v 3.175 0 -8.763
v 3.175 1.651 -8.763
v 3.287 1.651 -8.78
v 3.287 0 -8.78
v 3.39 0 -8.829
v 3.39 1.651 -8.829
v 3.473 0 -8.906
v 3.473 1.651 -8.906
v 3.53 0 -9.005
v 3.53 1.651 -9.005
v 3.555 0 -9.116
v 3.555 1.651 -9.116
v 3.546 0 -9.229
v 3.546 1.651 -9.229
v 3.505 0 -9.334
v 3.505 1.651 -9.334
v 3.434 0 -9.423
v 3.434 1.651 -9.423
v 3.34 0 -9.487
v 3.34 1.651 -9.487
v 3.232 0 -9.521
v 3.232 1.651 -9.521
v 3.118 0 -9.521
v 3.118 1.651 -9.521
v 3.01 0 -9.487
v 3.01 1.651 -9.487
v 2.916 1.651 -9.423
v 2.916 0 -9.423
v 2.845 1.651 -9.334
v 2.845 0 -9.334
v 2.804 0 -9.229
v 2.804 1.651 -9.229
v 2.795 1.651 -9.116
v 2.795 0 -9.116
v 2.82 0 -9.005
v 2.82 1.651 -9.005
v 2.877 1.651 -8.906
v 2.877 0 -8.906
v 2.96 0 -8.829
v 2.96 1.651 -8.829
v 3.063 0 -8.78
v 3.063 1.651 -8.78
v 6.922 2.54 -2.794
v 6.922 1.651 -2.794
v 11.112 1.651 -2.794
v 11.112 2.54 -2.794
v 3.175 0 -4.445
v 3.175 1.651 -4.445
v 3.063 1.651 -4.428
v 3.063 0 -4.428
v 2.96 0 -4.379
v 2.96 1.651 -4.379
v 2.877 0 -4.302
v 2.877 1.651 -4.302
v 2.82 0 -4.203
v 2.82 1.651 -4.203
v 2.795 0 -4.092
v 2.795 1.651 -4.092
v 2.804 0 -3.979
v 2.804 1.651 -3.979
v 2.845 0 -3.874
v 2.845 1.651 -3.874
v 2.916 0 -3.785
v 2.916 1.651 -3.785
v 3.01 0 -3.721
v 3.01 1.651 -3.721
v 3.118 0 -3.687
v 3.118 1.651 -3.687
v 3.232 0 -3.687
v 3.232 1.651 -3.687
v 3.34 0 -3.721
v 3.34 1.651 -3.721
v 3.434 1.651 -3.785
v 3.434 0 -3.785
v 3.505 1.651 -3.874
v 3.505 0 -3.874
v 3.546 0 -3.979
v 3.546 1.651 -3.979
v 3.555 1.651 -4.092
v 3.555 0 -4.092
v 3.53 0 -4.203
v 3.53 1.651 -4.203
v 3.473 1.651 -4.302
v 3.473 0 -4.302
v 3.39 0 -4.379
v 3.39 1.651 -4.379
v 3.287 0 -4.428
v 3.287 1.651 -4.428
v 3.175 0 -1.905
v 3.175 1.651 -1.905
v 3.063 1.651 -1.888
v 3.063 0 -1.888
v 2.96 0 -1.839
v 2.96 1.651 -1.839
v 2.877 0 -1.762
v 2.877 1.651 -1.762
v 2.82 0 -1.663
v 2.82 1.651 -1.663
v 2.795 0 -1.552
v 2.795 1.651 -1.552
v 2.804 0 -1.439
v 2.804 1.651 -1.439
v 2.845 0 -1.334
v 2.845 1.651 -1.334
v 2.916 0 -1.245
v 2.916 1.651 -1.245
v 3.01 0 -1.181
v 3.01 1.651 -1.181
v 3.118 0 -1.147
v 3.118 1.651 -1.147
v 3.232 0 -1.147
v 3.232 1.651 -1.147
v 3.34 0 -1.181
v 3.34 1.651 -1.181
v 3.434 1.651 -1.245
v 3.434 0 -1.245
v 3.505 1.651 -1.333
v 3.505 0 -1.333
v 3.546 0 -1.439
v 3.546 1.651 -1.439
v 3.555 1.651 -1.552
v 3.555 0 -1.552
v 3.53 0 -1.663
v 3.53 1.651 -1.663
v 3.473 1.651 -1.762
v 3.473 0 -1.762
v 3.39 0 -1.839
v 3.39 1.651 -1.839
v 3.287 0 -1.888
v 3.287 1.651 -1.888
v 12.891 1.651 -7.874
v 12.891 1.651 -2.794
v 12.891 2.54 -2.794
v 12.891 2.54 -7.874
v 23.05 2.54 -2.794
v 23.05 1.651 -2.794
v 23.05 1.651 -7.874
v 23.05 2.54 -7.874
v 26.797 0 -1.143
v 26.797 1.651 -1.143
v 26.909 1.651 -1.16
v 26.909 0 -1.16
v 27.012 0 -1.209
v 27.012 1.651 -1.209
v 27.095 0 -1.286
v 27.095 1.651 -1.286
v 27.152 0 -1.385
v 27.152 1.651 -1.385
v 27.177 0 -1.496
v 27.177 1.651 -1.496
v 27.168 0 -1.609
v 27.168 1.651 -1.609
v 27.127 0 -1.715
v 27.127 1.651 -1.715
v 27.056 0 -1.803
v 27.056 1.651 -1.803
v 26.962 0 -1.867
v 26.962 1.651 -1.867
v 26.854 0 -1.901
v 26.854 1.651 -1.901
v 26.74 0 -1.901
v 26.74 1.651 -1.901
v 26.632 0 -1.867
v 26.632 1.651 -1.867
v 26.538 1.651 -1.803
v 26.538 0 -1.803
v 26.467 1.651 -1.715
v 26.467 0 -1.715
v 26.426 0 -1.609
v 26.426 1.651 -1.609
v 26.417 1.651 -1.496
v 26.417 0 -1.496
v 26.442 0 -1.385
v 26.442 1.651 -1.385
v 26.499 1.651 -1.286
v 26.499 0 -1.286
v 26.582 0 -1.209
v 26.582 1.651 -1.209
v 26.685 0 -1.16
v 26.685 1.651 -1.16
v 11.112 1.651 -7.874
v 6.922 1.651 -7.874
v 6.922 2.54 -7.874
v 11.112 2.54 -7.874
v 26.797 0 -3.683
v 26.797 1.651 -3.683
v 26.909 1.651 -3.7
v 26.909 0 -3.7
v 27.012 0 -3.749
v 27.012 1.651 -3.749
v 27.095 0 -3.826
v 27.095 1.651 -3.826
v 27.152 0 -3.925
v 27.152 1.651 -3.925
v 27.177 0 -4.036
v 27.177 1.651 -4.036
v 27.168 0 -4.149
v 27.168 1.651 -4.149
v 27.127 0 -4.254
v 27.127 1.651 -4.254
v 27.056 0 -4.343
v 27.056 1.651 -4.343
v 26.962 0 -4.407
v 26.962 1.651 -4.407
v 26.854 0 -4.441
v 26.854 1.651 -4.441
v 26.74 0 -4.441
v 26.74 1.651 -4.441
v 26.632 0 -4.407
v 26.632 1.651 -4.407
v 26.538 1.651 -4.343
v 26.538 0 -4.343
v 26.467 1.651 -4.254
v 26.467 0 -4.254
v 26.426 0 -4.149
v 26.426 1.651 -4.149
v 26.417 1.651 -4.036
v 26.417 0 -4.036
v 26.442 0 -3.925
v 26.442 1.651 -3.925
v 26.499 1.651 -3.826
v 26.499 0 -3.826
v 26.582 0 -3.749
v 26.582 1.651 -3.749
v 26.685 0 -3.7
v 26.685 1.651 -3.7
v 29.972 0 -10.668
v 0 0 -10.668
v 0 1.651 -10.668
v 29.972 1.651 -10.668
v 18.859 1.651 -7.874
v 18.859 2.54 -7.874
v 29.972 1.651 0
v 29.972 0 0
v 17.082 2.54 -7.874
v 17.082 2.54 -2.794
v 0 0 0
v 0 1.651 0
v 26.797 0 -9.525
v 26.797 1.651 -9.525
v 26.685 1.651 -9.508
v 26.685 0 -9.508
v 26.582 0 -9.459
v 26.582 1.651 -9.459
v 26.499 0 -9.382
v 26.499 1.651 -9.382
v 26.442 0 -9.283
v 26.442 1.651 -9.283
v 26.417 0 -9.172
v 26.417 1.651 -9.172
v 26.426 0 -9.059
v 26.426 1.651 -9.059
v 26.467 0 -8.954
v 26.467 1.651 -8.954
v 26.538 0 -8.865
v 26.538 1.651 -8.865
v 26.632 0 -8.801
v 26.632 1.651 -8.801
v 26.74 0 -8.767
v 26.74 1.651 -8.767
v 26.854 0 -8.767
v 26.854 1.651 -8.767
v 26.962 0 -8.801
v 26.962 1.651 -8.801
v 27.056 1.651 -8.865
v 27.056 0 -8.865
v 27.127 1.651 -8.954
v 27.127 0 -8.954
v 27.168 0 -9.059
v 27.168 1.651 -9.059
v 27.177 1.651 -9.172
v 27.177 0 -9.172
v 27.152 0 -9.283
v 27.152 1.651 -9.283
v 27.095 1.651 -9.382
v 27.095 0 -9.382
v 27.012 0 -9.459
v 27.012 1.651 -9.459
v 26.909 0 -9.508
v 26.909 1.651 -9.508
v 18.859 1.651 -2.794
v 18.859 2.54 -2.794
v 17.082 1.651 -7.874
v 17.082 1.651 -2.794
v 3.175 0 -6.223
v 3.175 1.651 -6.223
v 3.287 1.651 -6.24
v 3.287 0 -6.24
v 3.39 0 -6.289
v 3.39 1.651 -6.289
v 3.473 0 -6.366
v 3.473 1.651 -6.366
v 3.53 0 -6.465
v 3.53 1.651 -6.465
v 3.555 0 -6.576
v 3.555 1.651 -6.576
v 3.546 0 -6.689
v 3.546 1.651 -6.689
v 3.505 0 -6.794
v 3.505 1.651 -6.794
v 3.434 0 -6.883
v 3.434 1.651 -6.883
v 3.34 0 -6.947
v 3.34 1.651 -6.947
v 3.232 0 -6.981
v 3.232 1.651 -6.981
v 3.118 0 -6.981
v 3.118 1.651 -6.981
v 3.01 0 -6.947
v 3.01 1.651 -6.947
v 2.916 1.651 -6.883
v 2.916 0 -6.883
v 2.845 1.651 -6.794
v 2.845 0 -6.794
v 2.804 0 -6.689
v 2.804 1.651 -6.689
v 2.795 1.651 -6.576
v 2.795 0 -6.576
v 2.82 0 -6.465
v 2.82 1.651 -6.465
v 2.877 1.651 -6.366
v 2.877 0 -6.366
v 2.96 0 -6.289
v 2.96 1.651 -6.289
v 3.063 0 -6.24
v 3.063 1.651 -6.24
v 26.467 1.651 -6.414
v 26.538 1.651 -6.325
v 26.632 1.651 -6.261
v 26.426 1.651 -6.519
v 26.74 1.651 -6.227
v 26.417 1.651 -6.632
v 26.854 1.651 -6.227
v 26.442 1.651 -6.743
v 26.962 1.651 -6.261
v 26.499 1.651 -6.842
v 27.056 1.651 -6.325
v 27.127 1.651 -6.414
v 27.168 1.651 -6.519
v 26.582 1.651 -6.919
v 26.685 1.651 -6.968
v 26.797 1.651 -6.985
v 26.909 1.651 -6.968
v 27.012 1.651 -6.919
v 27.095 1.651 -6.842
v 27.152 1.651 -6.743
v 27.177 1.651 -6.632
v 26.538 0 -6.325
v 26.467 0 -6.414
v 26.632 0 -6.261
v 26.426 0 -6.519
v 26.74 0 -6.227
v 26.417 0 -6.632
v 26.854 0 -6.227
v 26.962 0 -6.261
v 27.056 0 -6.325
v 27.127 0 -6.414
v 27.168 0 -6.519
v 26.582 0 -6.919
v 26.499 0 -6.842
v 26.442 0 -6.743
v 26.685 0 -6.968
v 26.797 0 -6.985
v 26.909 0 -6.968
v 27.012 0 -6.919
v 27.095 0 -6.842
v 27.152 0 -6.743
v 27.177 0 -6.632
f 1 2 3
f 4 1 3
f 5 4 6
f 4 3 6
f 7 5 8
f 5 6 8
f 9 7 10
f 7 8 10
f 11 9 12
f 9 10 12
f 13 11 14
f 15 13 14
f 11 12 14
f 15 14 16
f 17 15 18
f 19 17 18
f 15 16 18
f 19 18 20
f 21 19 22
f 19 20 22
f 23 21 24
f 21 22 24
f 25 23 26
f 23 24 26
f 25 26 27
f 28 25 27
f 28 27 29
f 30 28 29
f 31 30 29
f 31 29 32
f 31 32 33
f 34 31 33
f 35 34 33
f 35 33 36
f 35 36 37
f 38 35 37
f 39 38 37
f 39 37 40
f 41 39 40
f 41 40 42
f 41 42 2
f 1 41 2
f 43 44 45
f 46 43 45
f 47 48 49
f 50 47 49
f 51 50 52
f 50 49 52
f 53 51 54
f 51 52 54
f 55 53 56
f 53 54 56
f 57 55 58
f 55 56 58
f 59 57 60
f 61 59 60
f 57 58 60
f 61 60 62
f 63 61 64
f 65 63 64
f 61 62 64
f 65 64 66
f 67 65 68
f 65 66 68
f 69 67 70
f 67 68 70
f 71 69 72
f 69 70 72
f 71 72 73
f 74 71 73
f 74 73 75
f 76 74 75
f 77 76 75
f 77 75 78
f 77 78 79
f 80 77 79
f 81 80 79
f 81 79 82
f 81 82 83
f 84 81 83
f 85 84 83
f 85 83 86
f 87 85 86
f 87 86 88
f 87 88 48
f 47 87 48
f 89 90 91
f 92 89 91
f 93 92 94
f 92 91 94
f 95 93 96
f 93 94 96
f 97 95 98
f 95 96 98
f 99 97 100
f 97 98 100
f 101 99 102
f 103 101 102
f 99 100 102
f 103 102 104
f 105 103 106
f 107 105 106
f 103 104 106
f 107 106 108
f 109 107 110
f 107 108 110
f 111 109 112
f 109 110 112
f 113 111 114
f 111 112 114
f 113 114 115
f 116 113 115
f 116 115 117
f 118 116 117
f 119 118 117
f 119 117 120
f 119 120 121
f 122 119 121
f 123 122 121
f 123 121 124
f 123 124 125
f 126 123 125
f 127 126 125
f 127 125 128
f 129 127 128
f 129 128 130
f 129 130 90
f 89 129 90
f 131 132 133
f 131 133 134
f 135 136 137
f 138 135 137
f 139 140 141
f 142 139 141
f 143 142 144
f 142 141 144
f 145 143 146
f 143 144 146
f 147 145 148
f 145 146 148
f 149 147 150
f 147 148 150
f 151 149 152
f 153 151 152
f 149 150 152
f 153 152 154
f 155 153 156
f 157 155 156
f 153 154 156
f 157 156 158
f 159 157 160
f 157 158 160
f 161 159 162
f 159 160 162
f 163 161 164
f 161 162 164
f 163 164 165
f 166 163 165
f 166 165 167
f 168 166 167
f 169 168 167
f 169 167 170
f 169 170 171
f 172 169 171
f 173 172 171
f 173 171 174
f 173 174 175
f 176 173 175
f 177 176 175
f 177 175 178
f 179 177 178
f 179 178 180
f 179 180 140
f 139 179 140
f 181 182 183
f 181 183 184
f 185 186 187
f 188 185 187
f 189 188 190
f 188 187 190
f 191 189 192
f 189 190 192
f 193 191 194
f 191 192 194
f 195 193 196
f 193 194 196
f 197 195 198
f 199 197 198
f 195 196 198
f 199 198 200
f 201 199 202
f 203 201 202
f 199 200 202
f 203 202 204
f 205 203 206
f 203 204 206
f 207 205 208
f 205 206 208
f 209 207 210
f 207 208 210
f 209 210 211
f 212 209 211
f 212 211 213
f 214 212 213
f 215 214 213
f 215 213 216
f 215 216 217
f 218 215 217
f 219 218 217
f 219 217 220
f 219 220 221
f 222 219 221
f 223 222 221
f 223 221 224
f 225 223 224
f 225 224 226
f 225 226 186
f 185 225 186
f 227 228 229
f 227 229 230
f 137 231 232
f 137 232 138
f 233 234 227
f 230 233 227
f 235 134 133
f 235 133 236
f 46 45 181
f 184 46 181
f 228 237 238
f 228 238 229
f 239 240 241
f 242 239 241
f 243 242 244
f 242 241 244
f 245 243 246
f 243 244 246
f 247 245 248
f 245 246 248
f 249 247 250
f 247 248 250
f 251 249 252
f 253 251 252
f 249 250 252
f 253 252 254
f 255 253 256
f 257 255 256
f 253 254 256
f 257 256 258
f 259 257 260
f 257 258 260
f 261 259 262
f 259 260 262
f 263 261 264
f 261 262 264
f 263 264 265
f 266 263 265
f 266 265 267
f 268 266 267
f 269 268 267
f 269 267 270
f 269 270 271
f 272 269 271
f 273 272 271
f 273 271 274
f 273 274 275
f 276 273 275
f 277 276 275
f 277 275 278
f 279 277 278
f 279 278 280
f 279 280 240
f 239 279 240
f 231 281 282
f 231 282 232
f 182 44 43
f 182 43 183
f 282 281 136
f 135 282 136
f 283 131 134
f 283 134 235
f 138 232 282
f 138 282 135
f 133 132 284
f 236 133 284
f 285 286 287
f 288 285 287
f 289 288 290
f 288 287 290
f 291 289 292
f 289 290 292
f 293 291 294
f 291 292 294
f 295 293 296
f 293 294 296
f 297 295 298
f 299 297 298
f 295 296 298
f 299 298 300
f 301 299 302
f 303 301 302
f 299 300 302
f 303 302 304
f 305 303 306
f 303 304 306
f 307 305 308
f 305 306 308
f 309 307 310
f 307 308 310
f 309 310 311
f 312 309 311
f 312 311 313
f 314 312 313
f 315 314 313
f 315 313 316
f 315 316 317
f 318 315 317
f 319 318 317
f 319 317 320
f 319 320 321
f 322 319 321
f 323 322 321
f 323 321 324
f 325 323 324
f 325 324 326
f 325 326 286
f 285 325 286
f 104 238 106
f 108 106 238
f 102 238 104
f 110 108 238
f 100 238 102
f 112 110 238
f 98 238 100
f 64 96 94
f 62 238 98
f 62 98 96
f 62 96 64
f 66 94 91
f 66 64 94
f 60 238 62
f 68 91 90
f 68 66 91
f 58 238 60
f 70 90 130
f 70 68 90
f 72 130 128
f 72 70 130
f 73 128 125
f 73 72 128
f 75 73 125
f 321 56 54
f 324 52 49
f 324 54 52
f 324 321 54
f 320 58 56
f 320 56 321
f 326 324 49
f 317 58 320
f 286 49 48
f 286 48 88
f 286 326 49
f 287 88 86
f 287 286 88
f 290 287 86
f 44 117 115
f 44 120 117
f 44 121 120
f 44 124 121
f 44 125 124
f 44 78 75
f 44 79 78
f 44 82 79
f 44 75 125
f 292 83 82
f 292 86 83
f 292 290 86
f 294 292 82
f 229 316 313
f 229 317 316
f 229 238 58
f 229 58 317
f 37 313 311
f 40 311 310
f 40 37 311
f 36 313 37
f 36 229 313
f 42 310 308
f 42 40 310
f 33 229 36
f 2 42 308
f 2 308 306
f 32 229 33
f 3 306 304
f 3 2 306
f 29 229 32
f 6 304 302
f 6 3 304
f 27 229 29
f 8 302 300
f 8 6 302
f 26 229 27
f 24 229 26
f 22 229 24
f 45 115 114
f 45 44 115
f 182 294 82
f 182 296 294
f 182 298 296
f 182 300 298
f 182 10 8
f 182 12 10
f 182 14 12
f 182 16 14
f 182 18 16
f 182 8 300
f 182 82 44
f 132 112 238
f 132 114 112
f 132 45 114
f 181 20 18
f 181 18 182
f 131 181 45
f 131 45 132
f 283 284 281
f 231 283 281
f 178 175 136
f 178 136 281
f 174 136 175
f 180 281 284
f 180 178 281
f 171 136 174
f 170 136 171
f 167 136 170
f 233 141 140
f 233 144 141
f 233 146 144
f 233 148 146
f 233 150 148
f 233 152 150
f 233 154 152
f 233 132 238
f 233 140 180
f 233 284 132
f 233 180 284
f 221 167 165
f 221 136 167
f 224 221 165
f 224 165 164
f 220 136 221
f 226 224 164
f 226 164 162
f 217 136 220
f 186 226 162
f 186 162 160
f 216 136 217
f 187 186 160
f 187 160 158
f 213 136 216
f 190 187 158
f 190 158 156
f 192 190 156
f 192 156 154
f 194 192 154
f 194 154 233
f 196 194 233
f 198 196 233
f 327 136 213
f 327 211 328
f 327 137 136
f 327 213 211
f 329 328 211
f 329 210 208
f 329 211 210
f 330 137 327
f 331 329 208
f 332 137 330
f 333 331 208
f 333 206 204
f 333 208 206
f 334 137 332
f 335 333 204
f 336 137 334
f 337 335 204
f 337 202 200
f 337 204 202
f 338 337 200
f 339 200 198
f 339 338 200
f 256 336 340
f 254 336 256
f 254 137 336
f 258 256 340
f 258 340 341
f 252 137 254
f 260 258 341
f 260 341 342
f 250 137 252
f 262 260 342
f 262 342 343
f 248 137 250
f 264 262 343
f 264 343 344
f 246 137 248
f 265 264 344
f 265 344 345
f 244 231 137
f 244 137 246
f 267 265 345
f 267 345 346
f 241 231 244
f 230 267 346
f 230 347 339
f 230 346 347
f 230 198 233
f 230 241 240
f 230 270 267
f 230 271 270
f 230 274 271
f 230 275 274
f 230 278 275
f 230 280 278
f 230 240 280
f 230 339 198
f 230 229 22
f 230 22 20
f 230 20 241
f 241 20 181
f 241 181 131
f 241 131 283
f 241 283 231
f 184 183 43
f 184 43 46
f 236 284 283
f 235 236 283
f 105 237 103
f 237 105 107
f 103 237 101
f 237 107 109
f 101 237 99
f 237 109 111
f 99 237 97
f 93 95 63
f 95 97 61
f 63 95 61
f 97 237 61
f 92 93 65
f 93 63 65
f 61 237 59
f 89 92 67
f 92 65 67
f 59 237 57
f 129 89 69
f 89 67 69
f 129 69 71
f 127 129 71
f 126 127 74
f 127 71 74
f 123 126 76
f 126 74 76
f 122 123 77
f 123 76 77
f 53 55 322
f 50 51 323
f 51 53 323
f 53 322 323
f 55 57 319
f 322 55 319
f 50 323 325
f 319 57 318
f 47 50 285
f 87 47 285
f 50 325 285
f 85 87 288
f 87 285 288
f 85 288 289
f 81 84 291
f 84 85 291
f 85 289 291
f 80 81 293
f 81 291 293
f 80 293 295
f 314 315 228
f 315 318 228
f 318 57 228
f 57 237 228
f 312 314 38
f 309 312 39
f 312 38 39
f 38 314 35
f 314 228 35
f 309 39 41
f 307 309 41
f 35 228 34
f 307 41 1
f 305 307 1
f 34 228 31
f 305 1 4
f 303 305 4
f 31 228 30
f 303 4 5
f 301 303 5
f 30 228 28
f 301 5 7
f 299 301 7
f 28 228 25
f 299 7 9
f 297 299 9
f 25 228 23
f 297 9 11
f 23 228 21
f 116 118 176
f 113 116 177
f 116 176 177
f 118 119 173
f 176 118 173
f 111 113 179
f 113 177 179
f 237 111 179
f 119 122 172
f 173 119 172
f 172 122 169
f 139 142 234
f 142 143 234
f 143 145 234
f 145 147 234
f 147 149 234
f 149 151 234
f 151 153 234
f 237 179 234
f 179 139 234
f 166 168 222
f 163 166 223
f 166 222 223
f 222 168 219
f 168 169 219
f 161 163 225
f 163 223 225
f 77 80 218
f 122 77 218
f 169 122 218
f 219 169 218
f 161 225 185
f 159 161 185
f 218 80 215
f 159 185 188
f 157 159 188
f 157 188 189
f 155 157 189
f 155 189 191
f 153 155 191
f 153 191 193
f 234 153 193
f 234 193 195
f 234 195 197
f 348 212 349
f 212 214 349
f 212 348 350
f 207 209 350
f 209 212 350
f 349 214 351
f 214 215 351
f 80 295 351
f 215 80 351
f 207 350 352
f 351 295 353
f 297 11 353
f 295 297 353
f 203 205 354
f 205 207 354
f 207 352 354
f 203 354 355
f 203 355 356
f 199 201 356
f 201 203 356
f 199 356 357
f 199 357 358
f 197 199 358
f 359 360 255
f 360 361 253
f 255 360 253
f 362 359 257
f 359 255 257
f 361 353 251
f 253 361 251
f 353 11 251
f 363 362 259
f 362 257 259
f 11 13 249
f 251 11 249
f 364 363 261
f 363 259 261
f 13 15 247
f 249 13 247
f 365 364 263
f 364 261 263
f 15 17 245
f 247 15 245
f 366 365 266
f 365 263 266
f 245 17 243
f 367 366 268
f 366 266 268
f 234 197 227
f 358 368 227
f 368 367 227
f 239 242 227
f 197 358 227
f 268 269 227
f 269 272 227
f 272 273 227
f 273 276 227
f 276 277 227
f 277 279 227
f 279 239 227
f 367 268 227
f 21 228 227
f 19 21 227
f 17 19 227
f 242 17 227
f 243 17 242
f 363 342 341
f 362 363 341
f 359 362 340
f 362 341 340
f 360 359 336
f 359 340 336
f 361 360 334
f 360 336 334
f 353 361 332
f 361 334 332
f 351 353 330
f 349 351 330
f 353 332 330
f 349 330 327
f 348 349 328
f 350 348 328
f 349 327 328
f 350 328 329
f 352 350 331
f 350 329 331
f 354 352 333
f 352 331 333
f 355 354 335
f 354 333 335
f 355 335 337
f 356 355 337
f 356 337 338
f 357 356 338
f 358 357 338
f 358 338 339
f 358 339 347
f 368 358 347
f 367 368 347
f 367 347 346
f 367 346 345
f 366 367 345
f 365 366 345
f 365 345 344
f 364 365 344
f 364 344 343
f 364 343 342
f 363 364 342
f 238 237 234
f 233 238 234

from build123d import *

# Parameters (mm, degrees)
SKETCH1_W           = 29.972
SKETCH1_H           = 10.668
BOSS_EXTRUDE1_DEPTH = 1.651
SKETCH2_W           = 4.191
SKETCH2_H           = 5.08
BOSS_EXTRUDE2_DEPTH = 0.889
SKETCH3_R           = 0.381
CUT_EXTRUDE1_DEPTH  = 32.856754527


with BuildPart() as part:
    # Sketch1 → Boss-Extrude1 (new body)
    with BuildSketch(Plane(origin=(0, 0, 0), x_dir=(1, 0, 0), z_dir=(0, 1, 0))):
        with Locations((14.986, 5.334)):
            Rectangle(SKETCH1_W, SKETCH1_H)
    extrude(amount=BOSS_EXTRUDE1_DEPTH)

    # Sketch2 → Boss-Extrude2 (add)
    with BuildSketch(Plane(origin=(0, 1.651, 0), x_dir=(1, 0, 0), z_dir=(0, 1, 0))):
        with Locations((14.986, 5.334)):
            Rectangle(SKETCH2_W, SKETCH2_H)
        with Locations((9.017, 5.334)):
            Rectangle(SKETCH2_W, SKETCH2_H)
        with Locations((20.955, 5.334)):
            Rectangle(SKETCH2_W, SKETCH2_H)
    extrude(amount=BOSS_EXTRUDE2_DEPTH)

    # Sketch3 → Cut-Extrude1 (cut, through all)
    with BuildSketch(Plane(origin=(0, 1.651, 0), x_dir=(1, 0, 0), z_dir=(0, 1, 0))):
        with Locations(Location((26.797, 1.524, 0), (0, 0, 270))):
            Circle(SKETCH3_R)
        with Locations(Location((26.797, 4.064, 0), (0, 0, 270))):
            Circle(SKETCH3_R)
        with Locations(Location((26.797, 6.604, 0), (0, 0, 90))):
            Circle(SKETCH3_R)
        with Locations(Location((26.797, 9.144, 0), (0, 0, 90))):
            Circle(SKETCH3_R)
        with Locations(Location((3.175, 1.524, 0), (0, 0, 90))):
            Circle(SKETCH3_R)
        with Locations(Location((3.175, 4.064, 0), (0, 0, 90))):
            Circle(SKETCH3_R)
        with Locations(Location((3.175, 6.604, 0), (0, 0, 270))):
            Circle(SKETCH3_R)
        with Locations(Location((3.175, 9.144, 0), (0, 0, 270))):
            Circle(SKETCH3_R)
    extrude(amount=-CUT_EXTRUDE1_DEPTH, mode=Mode.SUBTRACT)


solid = part.part
